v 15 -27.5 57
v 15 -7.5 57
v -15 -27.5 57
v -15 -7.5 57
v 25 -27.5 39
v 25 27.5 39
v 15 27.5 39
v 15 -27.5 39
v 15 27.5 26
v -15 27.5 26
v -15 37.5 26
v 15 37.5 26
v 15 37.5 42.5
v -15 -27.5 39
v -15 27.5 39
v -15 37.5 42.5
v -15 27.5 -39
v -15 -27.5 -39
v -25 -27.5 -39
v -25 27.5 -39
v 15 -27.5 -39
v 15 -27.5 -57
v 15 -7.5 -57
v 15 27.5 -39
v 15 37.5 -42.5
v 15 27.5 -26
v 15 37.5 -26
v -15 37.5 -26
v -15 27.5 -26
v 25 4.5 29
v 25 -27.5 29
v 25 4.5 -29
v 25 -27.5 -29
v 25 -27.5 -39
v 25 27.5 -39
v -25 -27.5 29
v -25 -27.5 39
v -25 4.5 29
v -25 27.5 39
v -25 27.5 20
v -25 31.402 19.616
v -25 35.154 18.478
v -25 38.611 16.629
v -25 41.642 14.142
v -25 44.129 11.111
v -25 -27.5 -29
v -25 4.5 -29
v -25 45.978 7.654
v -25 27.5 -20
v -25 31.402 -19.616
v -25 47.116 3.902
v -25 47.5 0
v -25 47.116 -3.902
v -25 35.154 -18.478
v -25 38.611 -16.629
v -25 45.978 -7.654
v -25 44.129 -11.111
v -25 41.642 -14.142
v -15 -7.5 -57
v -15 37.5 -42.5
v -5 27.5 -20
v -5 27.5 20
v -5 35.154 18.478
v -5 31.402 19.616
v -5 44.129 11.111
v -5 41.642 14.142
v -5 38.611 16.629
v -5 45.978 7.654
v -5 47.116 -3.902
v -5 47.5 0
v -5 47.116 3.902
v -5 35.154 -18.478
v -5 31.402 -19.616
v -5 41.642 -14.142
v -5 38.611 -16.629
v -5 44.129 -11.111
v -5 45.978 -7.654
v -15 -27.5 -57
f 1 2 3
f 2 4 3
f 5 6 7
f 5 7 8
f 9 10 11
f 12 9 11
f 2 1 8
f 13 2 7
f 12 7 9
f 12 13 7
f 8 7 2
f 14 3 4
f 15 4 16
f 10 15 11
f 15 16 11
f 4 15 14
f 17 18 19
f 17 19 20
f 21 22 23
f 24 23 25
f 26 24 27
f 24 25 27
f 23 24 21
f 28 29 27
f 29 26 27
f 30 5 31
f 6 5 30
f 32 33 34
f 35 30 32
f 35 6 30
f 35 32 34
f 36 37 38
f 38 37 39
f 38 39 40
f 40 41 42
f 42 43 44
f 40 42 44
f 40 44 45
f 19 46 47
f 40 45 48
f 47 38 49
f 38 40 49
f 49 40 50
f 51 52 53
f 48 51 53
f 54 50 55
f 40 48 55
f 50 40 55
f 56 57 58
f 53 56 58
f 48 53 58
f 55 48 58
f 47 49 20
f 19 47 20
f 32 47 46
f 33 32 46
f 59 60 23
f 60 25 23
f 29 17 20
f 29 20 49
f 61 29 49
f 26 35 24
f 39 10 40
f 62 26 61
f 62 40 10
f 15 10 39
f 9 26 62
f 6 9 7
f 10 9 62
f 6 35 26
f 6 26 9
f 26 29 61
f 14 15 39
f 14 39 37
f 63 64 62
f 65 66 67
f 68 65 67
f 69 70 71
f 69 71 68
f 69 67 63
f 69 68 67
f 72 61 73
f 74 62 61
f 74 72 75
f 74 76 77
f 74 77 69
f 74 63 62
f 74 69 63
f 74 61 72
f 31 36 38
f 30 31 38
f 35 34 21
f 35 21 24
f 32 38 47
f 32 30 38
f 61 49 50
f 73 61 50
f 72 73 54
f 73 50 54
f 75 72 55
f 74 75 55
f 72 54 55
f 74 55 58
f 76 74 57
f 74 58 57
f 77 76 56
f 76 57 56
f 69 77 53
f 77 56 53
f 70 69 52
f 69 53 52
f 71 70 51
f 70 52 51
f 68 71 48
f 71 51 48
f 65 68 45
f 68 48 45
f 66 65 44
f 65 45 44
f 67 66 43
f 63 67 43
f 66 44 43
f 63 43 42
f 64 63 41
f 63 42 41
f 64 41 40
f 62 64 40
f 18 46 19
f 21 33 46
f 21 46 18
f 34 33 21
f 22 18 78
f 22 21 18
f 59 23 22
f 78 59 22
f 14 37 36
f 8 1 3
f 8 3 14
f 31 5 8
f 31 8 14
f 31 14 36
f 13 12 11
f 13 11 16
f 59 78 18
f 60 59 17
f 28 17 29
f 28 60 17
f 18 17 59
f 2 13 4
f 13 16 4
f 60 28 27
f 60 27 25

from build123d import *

# Parameters (mm, degrees)
SALIENTE_EXTRUIR1_DEPTH = 25
SALIENTE_EXTRUIR2_DEPTH = 15
SALIENTE_EXTRUIR3_START = -25
SALIENTE_EXTRUIR3_DEPTH = 20


with BuildPart() as part:
    # Croquis1 → Saliente-Extruir1 (new, symmetric)
    with BuildSketch(Plane(origin=(0, 0, 0), x_dir=(0, 0, -1), z_dir=(1, 0, 0))):
        Polygon((29, -27.5), (39, -27.5), (39, 27.5), (-39, 27.5), (-39, -27.5), (-29, -27.5), (-29, 4.5), (29, 4.5), align=None)
    extrude(amount=SALIENTE_EXTRUIR1_DEPTH, both=True)

    # Croquis2 → Saliente-Extruir2 (add, symmetric)
    with BuildSketch(Plane(origin=(0, 0, 0), x_dir=(0, 0, -1), z_dir=(1, 0, 0))):
        Polygon((-26, 27.5), (-26, 37.5), (-42.5, 37.5), (-57, -7.5), (-57, -27.5), (-39, -27.5), (-39, 27.5), align=None)
        Polygon((39, -27.5), (39, 27.5), (26, 27.5), (26, 37.5), (42.5, 37.5), (57, -7.5), (57, -27.5), align=None)
    extrude(amount=SALIENTE_EXTRUIR2_DEPTH, both=True)

    # Croquis3 → Saliente-Extruir3 (add)
    with BuildSketch(Plane(origin=(0, 0, 0), x_dir=(0, 0, -1), z_dir=(1, 0, 0)).offset(SALIENTE_EXTRUIR3_START)):
        with BuildLine():
            Line((-20, 27.5), (20, 27.5))
            ThreePointArc((20, 27.5), (0, 47.5), (-20, 27.5))
        make_face()
    extrude(amount=SALIENTE_EXTRUIR3_DEPTH)


solid = part.part
